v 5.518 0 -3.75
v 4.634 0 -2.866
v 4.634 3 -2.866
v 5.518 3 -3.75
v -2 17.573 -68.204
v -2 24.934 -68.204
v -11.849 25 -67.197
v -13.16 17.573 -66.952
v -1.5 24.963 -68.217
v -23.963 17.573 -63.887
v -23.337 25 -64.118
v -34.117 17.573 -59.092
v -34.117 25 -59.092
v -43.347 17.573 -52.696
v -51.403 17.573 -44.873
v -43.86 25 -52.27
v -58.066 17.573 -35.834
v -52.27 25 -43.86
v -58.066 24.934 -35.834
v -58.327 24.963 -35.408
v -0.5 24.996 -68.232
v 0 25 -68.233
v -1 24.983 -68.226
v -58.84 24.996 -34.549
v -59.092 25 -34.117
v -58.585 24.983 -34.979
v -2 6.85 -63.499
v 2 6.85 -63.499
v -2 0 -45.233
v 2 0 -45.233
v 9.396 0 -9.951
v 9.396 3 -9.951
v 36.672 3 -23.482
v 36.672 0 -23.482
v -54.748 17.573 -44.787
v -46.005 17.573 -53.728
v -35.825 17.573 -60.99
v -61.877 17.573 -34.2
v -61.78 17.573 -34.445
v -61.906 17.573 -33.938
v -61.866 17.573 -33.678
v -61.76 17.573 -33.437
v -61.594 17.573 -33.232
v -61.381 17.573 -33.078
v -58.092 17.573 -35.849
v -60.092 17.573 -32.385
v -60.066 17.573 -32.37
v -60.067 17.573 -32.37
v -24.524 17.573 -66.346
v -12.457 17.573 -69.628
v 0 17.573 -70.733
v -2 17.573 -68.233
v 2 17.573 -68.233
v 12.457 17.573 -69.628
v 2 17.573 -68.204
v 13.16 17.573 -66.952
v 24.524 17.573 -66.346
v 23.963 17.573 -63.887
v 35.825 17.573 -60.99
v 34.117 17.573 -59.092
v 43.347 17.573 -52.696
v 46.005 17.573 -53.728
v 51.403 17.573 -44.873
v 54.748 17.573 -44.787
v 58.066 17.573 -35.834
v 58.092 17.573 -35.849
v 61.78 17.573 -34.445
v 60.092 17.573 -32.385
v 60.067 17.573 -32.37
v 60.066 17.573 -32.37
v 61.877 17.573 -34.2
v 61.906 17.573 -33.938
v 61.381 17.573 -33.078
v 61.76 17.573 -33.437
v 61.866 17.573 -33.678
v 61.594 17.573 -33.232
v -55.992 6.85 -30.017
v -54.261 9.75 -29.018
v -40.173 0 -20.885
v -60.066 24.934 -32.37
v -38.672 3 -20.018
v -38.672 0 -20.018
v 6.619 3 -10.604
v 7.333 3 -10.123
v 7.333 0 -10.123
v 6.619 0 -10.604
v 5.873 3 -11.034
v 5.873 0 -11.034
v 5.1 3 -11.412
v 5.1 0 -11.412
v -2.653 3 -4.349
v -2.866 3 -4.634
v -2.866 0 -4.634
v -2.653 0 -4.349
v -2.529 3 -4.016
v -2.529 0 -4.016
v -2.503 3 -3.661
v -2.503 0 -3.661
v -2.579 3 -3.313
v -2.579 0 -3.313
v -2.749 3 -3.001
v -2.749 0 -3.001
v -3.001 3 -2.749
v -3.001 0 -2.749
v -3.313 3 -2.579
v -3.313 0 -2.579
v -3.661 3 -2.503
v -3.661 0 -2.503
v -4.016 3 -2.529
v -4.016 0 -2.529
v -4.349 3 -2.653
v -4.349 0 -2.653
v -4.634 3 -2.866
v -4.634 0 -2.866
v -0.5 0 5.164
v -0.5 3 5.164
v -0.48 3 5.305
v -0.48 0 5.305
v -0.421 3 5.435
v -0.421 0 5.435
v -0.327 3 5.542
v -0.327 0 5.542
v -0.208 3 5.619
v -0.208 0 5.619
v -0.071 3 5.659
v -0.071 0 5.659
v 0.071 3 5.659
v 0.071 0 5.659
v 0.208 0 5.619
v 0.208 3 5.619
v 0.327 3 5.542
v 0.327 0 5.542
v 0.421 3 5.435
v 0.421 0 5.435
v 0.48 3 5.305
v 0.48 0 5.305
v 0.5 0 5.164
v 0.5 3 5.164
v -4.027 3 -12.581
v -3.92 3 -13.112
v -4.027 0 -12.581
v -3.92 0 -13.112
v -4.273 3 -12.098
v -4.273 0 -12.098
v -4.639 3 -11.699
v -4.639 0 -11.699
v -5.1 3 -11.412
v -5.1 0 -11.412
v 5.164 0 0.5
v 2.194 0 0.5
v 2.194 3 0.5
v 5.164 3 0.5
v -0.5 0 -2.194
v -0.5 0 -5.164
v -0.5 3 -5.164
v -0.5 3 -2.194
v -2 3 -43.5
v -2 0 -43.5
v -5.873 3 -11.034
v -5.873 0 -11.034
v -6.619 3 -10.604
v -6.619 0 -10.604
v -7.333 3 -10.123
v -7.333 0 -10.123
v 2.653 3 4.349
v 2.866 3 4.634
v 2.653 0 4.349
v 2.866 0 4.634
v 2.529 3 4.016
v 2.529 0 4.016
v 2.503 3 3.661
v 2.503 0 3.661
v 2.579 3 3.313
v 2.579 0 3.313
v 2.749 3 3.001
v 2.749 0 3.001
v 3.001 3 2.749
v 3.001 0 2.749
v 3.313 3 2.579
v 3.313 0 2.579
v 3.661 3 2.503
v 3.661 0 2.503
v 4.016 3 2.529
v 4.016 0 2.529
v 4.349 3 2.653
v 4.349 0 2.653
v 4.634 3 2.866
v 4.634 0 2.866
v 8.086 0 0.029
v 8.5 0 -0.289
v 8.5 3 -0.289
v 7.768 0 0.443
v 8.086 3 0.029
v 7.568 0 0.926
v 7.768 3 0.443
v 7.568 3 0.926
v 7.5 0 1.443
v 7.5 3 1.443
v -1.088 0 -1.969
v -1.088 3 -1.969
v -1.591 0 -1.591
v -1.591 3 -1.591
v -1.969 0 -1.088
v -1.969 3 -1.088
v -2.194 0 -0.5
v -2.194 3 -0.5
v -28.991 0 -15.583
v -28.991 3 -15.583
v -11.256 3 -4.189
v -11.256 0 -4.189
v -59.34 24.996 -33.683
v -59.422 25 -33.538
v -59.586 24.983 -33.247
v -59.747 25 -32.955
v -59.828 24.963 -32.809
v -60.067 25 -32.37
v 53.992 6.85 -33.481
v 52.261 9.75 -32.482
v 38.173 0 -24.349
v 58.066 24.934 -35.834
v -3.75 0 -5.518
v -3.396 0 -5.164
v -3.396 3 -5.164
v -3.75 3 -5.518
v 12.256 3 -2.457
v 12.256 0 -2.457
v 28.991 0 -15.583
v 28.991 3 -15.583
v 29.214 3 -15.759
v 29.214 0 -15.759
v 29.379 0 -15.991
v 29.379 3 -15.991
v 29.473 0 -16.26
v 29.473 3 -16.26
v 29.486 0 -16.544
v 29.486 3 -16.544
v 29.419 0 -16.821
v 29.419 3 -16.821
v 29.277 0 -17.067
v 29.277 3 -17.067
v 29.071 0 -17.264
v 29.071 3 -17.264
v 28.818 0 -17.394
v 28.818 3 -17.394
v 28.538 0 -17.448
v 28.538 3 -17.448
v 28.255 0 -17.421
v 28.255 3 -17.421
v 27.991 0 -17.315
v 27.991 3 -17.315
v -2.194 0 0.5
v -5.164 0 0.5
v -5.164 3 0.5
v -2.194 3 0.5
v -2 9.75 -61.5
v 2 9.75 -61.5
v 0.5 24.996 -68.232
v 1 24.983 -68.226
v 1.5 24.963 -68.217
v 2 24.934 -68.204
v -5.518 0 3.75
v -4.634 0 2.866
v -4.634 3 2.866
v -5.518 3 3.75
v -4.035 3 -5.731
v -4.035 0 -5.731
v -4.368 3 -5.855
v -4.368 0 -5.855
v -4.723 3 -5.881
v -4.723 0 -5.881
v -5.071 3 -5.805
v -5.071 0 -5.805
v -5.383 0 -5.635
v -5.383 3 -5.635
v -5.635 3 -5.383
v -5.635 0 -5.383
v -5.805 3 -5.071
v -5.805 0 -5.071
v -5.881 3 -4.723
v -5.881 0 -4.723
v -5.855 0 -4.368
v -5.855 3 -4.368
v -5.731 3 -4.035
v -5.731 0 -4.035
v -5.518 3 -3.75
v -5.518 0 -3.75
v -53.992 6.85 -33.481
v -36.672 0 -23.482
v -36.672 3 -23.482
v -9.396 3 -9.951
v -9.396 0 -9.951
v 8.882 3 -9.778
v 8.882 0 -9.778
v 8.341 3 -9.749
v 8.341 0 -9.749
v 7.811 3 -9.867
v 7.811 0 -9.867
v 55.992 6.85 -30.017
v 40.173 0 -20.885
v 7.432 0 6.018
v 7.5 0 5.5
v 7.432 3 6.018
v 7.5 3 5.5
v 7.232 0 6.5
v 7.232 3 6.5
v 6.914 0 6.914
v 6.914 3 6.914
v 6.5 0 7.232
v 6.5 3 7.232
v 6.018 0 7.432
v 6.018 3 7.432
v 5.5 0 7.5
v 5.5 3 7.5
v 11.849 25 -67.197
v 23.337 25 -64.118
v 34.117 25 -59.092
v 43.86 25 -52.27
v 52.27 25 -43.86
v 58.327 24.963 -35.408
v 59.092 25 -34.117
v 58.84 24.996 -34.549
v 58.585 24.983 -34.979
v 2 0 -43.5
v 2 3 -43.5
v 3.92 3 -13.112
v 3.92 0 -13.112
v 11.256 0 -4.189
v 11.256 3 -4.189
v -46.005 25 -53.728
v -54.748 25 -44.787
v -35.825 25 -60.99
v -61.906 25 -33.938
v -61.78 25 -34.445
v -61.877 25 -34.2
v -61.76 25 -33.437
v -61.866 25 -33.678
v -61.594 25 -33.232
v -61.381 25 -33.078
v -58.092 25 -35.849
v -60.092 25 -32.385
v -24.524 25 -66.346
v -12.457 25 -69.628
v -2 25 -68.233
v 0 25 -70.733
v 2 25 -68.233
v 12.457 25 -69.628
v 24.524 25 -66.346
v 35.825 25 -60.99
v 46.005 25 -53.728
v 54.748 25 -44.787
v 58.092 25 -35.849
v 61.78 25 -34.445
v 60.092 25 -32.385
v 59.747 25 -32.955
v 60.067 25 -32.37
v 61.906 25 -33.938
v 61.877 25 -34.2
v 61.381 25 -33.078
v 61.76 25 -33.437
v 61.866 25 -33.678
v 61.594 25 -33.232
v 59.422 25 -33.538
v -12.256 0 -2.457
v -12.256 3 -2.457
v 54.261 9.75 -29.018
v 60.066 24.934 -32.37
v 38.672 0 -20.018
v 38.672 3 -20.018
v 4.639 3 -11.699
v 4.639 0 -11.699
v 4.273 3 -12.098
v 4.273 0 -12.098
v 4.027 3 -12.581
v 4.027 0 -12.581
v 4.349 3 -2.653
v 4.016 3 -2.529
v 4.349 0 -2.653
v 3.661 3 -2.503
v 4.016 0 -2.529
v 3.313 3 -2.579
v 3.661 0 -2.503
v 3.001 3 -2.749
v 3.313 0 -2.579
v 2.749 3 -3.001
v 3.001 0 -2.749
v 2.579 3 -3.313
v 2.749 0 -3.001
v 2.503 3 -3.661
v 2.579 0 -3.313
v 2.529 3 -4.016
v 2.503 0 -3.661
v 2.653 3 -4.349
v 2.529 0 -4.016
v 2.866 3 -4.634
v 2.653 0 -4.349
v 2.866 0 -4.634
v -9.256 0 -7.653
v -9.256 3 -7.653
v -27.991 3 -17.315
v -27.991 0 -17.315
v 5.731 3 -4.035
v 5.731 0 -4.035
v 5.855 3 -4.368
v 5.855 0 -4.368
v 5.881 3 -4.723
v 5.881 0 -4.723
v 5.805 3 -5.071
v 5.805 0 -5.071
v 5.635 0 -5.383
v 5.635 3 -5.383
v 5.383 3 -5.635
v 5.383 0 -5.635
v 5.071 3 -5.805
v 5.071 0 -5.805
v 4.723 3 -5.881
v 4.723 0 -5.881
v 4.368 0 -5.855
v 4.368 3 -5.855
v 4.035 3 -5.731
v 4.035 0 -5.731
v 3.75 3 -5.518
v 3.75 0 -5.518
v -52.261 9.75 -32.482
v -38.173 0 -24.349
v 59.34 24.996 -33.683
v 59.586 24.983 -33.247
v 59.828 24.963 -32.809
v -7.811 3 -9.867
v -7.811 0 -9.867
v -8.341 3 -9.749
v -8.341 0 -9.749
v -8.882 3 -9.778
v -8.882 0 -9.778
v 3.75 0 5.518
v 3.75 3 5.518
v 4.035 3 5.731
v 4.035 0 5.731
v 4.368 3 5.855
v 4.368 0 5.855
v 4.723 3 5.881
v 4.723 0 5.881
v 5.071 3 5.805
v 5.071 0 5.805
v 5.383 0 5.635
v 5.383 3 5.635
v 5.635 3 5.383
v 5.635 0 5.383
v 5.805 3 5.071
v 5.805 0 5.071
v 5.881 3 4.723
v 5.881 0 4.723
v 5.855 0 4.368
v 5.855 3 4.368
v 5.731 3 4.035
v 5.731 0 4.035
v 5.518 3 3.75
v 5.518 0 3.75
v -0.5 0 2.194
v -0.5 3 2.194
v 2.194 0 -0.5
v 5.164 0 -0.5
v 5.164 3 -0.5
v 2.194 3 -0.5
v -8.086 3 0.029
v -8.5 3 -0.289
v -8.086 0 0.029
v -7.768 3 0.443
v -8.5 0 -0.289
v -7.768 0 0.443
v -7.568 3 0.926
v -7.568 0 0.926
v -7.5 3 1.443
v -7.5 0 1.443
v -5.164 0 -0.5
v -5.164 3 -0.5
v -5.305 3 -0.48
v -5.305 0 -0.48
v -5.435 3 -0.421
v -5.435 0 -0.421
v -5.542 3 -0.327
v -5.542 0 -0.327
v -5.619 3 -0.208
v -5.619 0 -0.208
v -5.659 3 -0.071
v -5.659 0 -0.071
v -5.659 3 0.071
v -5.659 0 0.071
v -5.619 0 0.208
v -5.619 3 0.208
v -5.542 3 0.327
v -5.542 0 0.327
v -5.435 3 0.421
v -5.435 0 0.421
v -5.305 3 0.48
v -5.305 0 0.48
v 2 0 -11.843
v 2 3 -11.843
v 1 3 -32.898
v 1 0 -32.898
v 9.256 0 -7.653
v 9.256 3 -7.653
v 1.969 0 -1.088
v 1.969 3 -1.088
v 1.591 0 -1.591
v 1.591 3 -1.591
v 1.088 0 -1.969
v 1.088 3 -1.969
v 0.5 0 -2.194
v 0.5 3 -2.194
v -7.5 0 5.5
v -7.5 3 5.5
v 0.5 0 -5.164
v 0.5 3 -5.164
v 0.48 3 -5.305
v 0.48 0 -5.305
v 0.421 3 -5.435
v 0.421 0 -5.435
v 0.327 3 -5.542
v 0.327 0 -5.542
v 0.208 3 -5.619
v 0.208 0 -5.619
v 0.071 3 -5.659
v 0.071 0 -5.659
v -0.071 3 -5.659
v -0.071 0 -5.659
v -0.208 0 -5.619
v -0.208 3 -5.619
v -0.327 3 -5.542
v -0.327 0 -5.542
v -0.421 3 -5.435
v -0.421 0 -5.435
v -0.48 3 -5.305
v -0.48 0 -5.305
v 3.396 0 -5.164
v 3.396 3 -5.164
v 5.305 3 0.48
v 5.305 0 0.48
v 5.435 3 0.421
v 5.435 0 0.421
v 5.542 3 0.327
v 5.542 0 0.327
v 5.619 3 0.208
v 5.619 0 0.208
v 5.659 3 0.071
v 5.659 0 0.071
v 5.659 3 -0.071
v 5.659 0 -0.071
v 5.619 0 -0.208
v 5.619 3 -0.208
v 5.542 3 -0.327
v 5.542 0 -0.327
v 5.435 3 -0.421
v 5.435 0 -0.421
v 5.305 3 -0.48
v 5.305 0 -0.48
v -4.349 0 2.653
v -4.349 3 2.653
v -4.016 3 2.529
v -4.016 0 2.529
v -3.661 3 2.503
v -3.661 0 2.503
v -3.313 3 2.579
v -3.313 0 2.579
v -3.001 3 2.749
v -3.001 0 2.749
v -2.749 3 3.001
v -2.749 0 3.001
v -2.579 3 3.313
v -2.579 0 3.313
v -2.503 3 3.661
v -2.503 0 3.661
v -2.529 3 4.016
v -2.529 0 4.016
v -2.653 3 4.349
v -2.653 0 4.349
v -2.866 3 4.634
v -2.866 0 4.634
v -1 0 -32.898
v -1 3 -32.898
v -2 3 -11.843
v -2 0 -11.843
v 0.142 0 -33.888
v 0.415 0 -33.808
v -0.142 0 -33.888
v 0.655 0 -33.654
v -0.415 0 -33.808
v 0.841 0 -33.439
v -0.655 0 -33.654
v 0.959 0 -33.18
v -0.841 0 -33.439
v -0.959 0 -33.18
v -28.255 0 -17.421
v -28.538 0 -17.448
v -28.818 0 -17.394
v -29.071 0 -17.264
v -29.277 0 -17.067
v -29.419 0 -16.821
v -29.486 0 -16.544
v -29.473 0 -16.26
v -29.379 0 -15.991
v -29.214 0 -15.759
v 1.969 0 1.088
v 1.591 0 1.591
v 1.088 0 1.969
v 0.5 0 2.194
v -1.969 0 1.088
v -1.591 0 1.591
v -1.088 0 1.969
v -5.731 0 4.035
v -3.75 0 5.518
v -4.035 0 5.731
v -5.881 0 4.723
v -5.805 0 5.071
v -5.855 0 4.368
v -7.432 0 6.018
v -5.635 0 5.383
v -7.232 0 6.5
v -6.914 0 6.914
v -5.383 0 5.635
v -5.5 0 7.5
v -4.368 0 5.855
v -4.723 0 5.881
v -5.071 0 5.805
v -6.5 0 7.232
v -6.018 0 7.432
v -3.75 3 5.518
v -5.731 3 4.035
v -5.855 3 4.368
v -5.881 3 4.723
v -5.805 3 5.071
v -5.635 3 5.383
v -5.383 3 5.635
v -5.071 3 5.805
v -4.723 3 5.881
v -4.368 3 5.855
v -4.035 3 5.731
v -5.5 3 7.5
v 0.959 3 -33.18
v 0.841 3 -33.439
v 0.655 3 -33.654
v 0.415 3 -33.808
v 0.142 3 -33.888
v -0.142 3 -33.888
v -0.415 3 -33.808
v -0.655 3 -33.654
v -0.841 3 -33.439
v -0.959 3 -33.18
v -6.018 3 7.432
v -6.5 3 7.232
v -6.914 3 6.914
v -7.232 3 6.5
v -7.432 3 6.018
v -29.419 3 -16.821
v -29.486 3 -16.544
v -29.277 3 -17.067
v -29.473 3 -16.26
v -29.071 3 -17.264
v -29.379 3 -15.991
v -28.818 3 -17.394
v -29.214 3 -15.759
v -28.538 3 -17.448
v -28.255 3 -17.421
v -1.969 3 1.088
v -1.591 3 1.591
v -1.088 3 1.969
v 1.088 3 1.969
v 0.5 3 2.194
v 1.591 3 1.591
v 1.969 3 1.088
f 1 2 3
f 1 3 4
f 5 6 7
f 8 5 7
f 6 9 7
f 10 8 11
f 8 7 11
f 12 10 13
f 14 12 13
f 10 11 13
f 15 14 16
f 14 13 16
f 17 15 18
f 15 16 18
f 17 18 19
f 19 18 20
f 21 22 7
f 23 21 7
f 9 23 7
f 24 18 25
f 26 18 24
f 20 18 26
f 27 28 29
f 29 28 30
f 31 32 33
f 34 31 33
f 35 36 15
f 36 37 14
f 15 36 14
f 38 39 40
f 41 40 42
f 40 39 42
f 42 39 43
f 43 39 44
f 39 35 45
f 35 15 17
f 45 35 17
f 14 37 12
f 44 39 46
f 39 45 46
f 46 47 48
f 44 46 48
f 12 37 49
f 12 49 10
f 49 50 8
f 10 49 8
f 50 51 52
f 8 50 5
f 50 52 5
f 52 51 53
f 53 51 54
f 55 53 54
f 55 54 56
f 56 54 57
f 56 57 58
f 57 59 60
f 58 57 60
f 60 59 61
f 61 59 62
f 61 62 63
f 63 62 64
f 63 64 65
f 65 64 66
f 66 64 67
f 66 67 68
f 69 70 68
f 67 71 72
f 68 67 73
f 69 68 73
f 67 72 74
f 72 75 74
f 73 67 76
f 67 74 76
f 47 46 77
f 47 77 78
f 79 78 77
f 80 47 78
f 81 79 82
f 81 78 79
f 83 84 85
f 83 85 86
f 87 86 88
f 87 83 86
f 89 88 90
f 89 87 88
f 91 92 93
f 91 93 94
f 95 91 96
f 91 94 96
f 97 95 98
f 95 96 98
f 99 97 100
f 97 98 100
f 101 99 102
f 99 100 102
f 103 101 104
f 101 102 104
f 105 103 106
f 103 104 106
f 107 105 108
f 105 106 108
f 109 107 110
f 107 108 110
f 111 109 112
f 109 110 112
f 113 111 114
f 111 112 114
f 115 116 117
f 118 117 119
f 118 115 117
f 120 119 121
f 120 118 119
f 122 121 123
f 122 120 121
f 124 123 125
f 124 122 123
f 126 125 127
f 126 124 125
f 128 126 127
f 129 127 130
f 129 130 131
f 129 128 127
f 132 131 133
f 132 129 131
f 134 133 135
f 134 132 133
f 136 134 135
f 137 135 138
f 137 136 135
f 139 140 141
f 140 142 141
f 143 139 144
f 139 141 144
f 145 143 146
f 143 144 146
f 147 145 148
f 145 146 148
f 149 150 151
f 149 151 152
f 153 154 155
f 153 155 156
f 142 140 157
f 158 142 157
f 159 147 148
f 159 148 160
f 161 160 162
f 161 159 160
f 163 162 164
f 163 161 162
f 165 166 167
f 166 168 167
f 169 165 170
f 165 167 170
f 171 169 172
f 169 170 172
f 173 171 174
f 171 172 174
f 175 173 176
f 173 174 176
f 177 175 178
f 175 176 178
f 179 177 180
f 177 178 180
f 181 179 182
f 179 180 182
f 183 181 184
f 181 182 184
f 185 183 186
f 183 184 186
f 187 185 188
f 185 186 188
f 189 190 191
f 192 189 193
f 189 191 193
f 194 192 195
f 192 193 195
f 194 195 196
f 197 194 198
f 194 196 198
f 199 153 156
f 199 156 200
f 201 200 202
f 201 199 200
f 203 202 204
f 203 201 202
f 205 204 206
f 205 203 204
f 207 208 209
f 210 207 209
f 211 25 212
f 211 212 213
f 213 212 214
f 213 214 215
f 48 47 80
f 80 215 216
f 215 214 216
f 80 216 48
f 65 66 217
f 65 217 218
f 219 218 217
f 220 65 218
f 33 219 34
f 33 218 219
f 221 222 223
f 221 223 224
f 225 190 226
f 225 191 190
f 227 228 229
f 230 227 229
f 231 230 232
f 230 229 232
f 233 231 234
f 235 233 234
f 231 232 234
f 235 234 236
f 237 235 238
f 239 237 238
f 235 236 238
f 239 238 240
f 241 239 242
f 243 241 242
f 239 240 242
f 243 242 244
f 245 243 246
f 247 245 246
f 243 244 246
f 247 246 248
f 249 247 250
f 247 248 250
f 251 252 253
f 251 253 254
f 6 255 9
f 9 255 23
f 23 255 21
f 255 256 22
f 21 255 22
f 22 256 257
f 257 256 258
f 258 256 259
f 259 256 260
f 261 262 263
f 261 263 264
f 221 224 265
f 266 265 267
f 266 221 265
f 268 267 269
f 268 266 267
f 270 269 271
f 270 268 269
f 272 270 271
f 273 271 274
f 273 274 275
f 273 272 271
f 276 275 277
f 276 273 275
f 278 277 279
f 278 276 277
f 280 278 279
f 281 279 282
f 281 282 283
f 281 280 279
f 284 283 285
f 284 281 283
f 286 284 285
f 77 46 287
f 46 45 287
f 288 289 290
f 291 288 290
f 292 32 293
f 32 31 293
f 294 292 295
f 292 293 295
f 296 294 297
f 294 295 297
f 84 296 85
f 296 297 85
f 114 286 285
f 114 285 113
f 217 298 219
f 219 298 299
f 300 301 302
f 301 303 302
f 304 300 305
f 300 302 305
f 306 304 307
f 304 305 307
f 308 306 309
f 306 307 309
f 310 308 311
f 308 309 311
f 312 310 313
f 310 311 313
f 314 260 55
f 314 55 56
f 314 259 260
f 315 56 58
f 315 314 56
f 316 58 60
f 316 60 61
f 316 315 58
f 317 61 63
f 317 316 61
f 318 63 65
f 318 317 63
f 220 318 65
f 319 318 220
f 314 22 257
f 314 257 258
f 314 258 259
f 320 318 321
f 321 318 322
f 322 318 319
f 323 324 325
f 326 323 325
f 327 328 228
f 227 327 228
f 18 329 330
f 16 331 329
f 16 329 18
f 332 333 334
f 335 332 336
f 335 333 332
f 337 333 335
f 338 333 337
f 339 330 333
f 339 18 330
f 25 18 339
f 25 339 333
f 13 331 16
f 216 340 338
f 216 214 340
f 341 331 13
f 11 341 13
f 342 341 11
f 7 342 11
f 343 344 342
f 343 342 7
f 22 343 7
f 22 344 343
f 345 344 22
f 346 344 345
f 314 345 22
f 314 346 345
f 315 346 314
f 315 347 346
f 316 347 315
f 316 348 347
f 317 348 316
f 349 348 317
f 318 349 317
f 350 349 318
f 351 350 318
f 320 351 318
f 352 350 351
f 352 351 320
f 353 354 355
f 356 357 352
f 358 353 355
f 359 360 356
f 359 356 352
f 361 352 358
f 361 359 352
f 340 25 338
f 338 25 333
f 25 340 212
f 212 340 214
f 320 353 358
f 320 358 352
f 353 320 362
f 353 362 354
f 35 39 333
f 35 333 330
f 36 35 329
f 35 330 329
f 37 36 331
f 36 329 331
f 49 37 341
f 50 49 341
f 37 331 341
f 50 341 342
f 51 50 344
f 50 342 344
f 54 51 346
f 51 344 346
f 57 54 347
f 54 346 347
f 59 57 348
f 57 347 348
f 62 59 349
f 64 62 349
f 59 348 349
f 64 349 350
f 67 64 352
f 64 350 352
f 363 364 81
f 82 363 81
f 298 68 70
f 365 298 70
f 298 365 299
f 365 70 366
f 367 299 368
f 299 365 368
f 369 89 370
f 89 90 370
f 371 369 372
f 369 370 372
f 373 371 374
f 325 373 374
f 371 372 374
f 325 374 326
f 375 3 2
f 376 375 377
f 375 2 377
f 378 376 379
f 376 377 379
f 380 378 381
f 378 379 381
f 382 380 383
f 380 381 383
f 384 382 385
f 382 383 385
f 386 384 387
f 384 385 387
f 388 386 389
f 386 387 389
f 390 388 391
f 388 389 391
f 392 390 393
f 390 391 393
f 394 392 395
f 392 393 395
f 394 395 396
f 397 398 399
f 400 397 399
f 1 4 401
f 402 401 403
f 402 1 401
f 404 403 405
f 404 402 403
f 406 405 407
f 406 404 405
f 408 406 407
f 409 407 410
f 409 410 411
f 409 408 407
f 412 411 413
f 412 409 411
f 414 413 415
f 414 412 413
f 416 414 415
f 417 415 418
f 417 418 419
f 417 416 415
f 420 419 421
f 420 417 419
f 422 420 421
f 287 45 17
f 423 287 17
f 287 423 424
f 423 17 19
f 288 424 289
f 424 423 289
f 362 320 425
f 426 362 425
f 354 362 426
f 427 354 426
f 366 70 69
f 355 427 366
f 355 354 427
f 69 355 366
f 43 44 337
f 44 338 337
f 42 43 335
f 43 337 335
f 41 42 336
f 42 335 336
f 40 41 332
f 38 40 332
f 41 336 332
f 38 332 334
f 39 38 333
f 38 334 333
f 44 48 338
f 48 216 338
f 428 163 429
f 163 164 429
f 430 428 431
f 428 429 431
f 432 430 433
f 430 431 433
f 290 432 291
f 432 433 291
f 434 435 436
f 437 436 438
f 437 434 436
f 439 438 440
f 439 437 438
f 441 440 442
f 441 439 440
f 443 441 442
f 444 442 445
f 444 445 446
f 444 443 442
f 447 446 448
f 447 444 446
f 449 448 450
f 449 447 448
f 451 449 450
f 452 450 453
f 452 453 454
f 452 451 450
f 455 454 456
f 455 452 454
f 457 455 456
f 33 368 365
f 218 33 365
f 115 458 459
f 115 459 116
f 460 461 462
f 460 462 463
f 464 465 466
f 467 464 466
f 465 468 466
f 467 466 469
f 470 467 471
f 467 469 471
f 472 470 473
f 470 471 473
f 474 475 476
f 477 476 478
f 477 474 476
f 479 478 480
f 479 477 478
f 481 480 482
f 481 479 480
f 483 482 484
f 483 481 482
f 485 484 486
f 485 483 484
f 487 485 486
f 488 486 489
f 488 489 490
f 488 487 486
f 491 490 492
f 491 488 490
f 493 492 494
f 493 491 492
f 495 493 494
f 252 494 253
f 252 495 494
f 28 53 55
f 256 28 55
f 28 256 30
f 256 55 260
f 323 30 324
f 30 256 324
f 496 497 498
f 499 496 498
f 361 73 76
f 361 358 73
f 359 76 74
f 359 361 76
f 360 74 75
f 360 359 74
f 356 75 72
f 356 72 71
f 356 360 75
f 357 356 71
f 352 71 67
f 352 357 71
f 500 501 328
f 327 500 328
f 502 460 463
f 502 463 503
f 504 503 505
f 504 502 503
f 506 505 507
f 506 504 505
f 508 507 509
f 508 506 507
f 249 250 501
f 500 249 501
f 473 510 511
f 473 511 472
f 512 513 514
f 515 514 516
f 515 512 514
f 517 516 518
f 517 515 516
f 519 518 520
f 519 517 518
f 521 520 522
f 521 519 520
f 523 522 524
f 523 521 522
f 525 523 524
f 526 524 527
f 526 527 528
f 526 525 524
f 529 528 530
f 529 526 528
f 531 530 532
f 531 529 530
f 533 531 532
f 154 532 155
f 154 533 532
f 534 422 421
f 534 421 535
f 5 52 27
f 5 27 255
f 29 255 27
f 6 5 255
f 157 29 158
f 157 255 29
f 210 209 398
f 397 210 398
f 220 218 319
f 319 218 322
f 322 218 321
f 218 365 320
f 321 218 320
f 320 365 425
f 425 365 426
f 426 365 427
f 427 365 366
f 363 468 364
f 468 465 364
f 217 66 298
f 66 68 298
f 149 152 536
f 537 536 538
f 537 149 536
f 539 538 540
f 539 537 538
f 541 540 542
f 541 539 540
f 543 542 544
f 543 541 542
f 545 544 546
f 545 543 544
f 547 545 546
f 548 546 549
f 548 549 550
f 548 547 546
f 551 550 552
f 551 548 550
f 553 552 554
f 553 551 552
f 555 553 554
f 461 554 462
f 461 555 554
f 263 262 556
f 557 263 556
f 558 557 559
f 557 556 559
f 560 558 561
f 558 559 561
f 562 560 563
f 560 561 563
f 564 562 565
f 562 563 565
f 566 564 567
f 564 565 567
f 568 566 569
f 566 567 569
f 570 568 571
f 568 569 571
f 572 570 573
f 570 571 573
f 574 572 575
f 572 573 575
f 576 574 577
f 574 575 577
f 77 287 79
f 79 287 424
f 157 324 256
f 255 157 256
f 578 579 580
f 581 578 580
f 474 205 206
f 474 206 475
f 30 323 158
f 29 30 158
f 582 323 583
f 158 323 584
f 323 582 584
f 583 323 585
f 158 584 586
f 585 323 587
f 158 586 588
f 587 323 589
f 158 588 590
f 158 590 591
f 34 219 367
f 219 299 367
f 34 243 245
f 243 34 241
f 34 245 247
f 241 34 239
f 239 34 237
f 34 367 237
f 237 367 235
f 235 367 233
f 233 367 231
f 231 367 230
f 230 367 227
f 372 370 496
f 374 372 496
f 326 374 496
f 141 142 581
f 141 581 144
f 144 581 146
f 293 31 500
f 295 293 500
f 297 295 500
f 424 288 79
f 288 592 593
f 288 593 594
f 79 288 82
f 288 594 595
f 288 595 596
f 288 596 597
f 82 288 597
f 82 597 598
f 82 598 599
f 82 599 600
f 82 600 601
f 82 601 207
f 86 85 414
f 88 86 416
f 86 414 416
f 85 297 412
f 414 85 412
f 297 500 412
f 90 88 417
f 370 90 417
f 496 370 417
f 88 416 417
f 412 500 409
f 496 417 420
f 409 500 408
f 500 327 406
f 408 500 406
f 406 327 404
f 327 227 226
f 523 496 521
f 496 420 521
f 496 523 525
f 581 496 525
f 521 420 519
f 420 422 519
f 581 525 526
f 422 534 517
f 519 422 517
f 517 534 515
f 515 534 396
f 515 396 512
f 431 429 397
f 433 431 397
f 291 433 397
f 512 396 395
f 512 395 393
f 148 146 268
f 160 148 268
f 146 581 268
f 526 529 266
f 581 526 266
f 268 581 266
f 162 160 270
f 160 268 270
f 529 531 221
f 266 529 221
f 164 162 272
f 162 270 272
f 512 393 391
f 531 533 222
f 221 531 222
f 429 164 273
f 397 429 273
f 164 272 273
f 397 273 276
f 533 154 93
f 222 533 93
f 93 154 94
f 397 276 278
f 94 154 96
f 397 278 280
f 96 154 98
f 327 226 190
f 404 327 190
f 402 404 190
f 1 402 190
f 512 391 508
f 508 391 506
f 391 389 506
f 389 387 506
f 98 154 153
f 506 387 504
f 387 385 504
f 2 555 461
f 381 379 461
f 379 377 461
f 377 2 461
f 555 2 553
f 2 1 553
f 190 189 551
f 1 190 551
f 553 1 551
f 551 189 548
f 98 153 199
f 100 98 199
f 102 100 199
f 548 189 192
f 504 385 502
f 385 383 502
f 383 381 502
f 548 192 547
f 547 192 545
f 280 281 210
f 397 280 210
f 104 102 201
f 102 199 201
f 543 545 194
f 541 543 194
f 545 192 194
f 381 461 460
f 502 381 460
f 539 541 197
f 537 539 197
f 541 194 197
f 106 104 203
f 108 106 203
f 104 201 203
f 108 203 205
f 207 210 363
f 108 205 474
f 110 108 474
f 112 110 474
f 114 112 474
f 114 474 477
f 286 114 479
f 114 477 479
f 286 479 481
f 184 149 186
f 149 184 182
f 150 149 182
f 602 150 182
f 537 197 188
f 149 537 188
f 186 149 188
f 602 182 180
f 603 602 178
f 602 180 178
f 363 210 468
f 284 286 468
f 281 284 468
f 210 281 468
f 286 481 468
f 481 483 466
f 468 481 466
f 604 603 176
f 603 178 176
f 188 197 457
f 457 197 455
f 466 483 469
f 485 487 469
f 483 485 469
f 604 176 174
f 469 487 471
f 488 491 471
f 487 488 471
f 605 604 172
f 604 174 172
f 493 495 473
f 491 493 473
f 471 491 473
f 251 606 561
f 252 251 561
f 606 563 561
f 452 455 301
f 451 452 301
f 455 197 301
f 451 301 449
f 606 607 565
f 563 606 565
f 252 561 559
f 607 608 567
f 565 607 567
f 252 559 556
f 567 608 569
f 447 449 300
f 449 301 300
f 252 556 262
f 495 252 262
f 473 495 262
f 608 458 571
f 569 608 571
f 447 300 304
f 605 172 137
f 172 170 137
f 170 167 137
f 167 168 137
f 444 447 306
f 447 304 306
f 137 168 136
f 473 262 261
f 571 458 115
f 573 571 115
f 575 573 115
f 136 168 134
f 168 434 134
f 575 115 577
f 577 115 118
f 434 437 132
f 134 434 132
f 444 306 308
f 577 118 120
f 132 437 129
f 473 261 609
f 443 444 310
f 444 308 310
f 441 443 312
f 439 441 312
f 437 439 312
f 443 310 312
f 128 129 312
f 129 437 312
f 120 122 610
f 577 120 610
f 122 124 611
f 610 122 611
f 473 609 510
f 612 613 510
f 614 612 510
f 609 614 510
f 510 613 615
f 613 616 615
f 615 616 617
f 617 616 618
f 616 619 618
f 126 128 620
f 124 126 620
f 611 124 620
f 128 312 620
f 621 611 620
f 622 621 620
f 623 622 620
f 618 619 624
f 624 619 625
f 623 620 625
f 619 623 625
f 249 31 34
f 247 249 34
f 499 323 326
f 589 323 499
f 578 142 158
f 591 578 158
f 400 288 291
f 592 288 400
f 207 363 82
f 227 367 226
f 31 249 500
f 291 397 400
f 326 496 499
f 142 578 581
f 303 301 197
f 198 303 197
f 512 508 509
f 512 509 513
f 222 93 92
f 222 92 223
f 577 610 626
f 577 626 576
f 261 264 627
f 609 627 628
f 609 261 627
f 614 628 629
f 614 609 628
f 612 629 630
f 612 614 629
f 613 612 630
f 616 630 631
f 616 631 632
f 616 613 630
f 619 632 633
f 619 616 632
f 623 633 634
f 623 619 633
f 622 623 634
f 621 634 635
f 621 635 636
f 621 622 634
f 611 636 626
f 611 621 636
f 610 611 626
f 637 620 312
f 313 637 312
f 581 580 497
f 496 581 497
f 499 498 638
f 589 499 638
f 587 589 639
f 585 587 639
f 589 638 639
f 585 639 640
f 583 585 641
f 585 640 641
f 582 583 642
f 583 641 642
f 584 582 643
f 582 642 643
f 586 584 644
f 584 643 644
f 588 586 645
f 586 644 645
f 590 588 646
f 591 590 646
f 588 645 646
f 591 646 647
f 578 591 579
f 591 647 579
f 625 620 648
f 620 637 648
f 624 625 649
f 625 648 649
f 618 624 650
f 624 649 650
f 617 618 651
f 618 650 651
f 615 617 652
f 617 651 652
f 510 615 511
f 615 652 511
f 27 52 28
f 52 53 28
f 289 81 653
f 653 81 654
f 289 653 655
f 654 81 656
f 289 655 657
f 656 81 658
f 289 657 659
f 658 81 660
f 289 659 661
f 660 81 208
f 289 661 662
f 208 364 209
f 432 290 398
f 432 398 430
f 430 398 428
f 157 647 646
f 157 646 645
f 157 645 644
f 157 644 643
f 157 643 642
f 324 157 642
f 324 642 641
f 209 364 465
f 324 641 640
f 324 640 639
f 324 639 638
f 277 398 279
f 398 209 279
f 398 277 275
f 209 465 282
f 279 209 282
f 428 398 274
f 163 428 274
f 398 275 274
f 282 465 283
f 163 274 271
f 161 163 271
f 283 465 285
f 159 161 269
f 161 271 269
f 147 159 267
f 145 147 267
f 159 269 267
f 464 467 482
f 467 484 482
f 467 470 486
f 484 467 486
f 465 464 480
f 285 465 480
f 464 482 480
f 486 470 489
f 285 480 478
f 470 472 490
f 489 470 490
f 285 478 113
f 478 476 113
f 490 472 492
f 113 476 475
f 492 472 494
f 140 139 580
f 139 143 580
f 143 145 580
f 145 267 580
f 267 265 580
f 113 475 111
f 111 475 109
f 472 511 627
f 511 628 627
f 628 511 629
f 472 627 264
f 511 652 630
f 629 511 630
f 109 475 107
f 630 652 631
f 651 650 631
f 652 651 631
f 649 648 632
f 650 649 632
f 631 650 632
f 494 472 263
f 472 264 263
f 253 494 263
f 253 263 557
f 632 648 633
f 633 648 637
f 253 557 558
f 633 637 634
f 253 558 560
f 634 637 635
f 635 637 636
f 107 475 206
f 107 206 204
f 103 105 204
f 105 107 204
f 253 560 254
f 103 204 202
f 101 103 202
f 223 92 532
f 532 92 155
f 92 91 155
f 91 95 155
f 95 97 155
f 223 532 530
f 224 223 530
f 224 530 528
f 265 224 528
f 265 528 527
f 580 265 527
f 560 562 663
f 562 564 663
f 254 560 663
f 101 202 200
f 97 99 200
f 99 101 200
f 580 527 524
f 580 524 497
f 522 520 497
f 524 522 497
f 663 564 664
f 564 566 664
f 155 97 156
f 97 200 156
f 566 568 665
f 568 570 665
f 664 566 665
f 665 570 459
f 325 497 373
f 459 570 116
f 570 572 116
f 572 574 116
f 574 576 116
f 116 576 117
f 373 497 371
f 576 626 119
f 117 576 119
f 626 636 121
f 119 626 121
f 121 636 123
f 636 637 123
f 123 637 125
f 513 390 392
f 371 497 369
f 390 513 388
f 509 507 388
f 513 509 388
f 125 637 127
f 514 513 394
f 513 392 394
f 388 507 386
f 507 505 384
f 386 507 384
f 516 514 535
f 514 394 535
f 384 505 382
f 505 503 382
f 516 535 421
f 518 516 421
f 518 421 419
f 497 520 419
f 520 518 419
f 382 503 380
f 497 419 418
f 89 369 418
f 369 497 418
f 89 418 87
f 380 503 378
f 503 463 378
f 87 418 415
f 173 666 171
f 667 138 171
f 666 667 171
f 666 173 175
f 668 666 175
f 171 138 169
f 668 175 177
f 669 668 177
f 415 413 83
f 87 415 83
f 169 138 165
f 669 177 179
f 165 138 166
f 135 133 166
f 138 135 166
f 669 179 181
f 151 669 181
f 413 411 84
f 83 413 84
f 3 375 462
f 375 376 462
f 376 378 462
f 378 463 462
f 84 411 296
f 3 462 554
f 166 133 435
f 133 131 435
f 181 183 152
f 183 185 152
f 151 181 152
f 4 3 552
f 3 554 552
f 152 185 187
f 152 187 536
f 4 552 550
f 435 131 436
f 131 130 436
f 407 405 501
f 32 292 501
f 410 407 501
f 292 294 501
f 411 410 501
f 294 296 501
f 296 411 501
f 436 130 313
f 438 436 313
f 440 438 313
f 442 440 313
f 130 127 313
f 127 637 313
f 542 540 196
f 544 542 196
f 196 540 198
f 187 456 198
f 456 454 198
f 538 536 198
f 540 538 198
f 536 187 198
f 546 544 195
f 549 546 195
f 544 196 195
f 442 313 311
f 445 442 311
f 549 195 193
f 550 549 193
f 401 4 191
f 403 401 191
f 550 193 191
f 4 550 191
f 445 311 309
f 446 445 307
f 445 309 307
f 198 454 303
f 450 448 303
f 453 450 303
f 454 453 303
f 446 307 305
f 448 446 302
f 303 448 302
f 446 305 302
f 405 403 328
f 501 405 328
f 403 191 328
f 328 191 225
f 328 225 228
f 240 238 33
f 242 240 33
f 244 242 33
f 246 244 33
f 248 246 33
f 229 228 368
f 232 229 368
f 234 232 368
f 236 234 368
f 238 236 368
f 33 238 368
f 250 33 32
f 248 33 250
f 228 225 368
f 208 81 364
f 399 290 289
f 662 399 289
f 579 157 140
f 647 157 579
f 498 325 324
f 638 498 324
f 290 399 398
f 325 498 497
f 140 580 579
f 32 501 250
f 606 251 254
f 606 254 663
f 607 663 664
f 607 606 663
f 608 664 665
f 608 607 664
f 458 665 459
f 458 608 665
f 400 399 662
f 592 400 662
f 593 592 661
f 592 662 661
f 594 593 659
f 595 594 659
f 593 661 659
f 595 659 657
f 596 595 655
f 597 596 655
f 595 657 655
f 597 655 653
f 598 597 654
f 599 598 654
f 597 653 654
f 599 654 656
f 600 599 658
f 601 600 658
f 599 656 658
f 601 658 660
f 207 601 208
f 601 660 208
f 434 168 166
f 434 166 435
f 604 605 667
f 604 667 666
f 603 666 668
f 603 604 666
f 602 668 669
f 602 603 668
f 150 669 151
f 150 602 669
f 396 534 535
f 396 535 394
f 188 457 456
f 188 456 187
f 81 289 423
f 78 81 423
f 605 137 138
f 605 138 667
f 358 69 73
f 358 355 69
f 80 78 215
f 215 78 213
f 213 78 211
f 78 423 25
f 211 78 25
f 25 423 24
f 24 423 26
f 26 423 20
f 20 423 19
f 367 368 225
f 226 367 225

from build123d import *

# Parameters (mm, degrees)
SKETCH1_W                       = 15
SKETCH1_H                       = 15
BOSS_EXTRUDE1_DEPTH             = 3
BOSS_EXTRUDE2_START             = -1.18
SKETCH7_W                       = 8
SKETCH7_H                       = 3
BOSS_EXTRUDE2_DEPTH             = 6.18
CIRPATTERN2_COUNT               = 2
CIRPATTERN2_ANGLE               = 60
CIRPATTERN2_THE_OTHER_WAY_COUNT = 2
CIRPATTERN2_THE_OTHER_WAY_ANGLE = 60
TAP_DRILL_FOR_M3_TAP1_D         = 2.5
BOSS_EXTRUDE4_DEPTH             = 3
CUT_EXTRUDE1_START              = -10
CUT_EXTRUDE1_DEPTH              = 10
FILLET12_R                      = 2
SKETCH22_W                      = 31
SKETCH22_H                      = 3
BOSS_EXTRUDE11_DEPTH            = 4
CIRPATTERN8_COUNT               = 2
CIRPATTERN8_ANGLE               = 60
CIRPATTERN8_THE_OTHER_WAY_COUNT = 2
CIRPATTERN8_THE_OTHER_WAY_ANGLE = 60
CUT_EXTRUDE2_DEPTH              = 15
FILLET13_R                      = 2
BOSS_EXTRUDE12_DEPTH            = 2
CIRPATTERN9_COUNT               = 2
CIRPATTERN9_ANGLE               = 60
CIRPATTERN9_THE_OTHER_WAY_COUNT = 2
CIRPATTERN9_THE_OTHER_WAY_ANGLE = 60
SKETCH25_W                      = 2.5
SKETCH25_H                      = 7.427363245
REVOLVE1_ANGLE                  = 61.68
REVOLVE1_OTHER_WAY_ANGLE        = 61.68
FILLET14_R                      = 1


with BuildPart() as part:
    # Sketch1 → Boss-Extrude1 (new body)
    with BuildSketch(Plane(origin=(0, 0, 0), x_dir=(1, 0, 0), z_dir=(0, 1, 0))):
        Rectangle(SKETCH1_W, SKETCH1_H)
    extrude(amount=BOSS_EXTRUDE1_DEPTH)

    # Sketch7 → Boss-Extrude2 (add)
    with BuildSketch(Plane(origin=(0, 0, -7.5), x_dir=(-1, 0, 0), z_dir=(0, 0, -1)).offset(BOSS_EXTRUDE2_START)):
        with Locations((0, 1.5)):
            Rectangle(SKETCH7_W, SKETCH7_H)
    boss_extrude2 = extrude(amount=BOSS_EXTRUDE2_DEPTH)

    # CirPattern2: Boss-Extrude2 ×2 about axis
    cirpattern2_axis = Axis((0, 0, 0), (0, -1, 0))
    for i in range(1, CIRPATTERN2_COUNT):
        add(boss_extrude2.rotate(cirpattern2_axis, i * CIRPATTERN2_ANGLE / (CIRPATTERN2_COUNT - 1)))

    # CirPattern2 the other way: Boss-Extrude2 ×2 about axis
    cirpattern2_the_other_way_axis = Axis((0, 0, 0), (0, 1, 0))
    for i in range(1, CIRPATTERN2_THE_OTHER_WAY_COUNT):
        add(boss_extrude2.rotate(cirpattern2_the_other_way_axis, i * CIRPATTERN2_THE_OTHER_WAY_ANGLE / (CIRPATTERN2_THE_OTHER_WAY_COUNT - 1)))

    # Tap Drill for M3 Tap1 (through all)
    with Locations(Plane(origin=(0, 3, 0), x_dir=(1, 0, 0), z_dir=(0, 1, 0))):
        with Locations((-3.75, -3.75), (-3.75, 3.75), (3.75, -3.75), (3.75, 3.75)):
            Hole(TAP_DRILL_FOR_M3_TAP1_D / 2)

    # Sketch10 → Boss-Extrude4 (add)
    with BuildSketch(Plane(origin=(0, 3, 0), x_dir=(1, 0, 0), z_dir=(0, 1, 0))):
        with BuildLine():
            Line((4.990381057, 7.5), (8.256095748, 9.385461256))
            ThreePointArc((8.256095748, 9.385461256), (6.25, 10.825317547), (4, 11.842719282))
            Line((4, 11.842719282), (4, 7.5))
            Line((4, 7.5), (4.990381057, 7.5))
        make_face()
        with BuildLine():
            ThreePointArc((-4, 11.842719282), (-6.25, 10.825317547), (-8.256095748, 9.385461256))
            Line((-8.256095748, 9.385461256), (-4.990381057, 7.5))
            Line((-4.990381057, 7.5), (-4, 7.5))
            Line((-4, 7.5), (-4, 11.842719282))
        make_face()
    extrude(amount=-BOSS_EXTRUDE4_DEPTH)

    # Sketch21 → Cut-Extrude1 (cut)
    with BuildSketch(Plane(origin=(0, 3, 0), x_dir=(1, 0, 0), z_dir=(0, 1, 0)).offset(CUT_EXTRUDE1_START)):
        with BuildLine():
            ThreePointArc((-4.633883476, 2.866116524), (-4.633883476, 4.633883476), (-2.866116524, 4.633883476))
            Line((-2.866116524, 4.633883476), (-3.396446609, 5.164213562))
            Line((-3.396446609, 5.164213562), (-3.75, 5.517766953))
            ThreePointArc((-3.75, 5.517766953), (-5.517766953, 5.517766953), (-5.517766953, 3.75))
            Line((-5.517766953, 3.75), (-4.633883476, 2.866116524))
        make_face()
        with BuildLine():
            ThreePointArc((-0.5, 2.193741097), (-1.590990258, 1.590990258), (-2.193741097, 0.5))
            Line((-2.193741097, 0.5), (-5.164213562, 0.5))
            ThreePointArc((-5.164213562, 0.5), (-5.664213562, 0), (-5.164213562, -0.5))
            Line((-5.164213562, -0.5), (-2.193741097, -0.5))
            ThreePointArc((-2.193741097, -0.5), (-1.590990258, -1.590990258), (-0.5, -2.193741097))
            Line((-0.5, -2.193741097), (-0.5, -5.164213562))
            ThreePointArc((-0.5, -5.164213562), (0, -5.664213562), (0.5, -5.164213562))
            Line((0.5, -5.164213562), (0.5, -2.193741097))
            ThreePointArc((0.5, -2.193741097), (1.590990258, -1.590990258), (2.193741097, -0.5))
            Line((2.193741097, -0.5), (5.164213562, -0.5))
            ThreePointArc((5.164213562, -0.5), (5.664213562, 0), (5.164213562, 0.5))
            Line((5.164213562, 0.5), (2.193741097, 0.5))
            ThreePointArc((2.193741097, 0.5), (1.590990258, 1.590990258), (0.5, 2.193741097))
            Line((0.5, 2.193741097), (0.5, 5.164213562))
            ThreePointArc((0.5, 5.164213562), (0, 5.664213562), (-0.5, 5.164213562))
            Line((-0.5, 5.164213562), (-0.5, 2.193741097))
        make_face()
        with BuildLine():
            Line((3.75, 5.517766953), (3.396446609, 5.164213562))
            Line((3.396446609, 5.164213562), (2.866116524, 4.633883476))
            ThreePointArc((2.866116524, 4.633883476), (4.633883476, 4.633883476), (4.633883476, 2.866116524))
            Line((4.633883476, 2.866116524), (5.517766953, 3.75))
            ThreePointArc((5.517766953, 3.75), (5.517766953, 5.517766953), (3.75, 5.517766953))
        make_face()
        with BuildLine():
            Line((5.517766953, -3.75), (4.633883476, -2.866116524))
            ThreePointArc((4.633883476, -2.866116524), (4.633883476, -4.633883476), (2.866116524, -4.633883476))
            Line((2.866116524, -4.633883476), (3.75, -5.517766953))
            ThreePointArc((3.75, -5.517766953), (5.517766953, -5.517766953), (5.517766953, -3.75))
        make_face()
        with BuildLine():
            Line((-4.633883476, -2.866116524), (-5.517766953, -3.75))
            ThreePointArc((-5.517766953, -3.75), (-5.517766953, -5.517766953), (-3.75, -5.517766953))
            Line((-3.75, -5.517766953), (-2.866116524, -4.633883476))
            ThreePointArc((-2.866116524, -4.633883476), (-4.633883476, -4.633883476), (-4.633883476, -2.866116524))
        make_face()
    extrude(amount=CUT_EXTRUDE1_DEPTH, mode=Mode.SUBTRACT)

    # Fillet12
    fillet12_edges = [part.edges().sort_by_distance(p)[0] for p in [
        (7.5, 1.5, 7.5),
        (-7.5, 1.5, 7.5),
    ]]
    fillet(fillet12_edges, radius=FILLET12_R)

    # Sketch22 → Boss-Extrude11 (add, symmetric)
    with BuildSketch(Plane(origin=(0, 0, 0), x_dir=(0, 0, -1), z_dir=(1, 0, 0))):
        with Locations((28, 1.5)):
            Rectangle(SKETCH22_W, SKETCH22_H)
    boss_extrude11 = extrude(amount=BOSS_EXTRUDE11_DEPTH, both=True)

    # CirPattern8: Boss-Extrude11 ×2 about axis
    cirpattern8_axis = Axis((0, 0, 0), (0, 1, 0))
    for i in range(1, CIRPATTERN8_COUNT):
        add(boss_extrude11.rotate(cirpattern8_axis, i * CIRPATTERN8_ANGLE / (CIRPATTERN8_COUNT - 1)))

    # CirPattern8 the other way: Boss-Extrude11 ×2 about axis
    cirpattern8_the_other_way_axis = Axis((0, 0, 0), (0, -1, 0))
    for i in range(1, CIRPATTERN8_THE_OTHER_WAY_COUNT):
        add(boss_extrude11.rotate(cirpattern8_the_other_way_axis, i * CIRPATTERN8_THE_OTHER_WAY_ANGLE / (CIRPATTERN8_THE_OTHER_WAY_COUNT - 1)))

    # Sketch23 → Cut-Extrude2 (cut)
    with BuildSketch(Plane(origin=(0, 3, 0), x_dir=(1, 0, 0), z_dir=(0, 1, 0))):
        with BuildLine():
            Line((0, 11.842719282), (2, 11.842719282))
            Line((2, 11.842719282), (1, 32.898140757))
            ThreePointArc((1, 32.898140757), (0, 33.898140757), (-1, 32.898140757))
            Line((-1, 32.898140757), (-2, 11.842719282))
            Line((-2, 11.842719282), (0, 11.842719282))
        make_face()
        Polygon((2, 43.5), (4, 11.842719282), (4, 43.5), align=None)
        Polygon((35.672105065, 25.214101615), (8.256095748, 9.385461256), (36.672105065, 23.482050808), align=None)
        Polygon((-4, 43.5), (-4, 11.842719282), (-2, 43.5), align=None)
        with BuildLine():
            Line((27.990625633, 17.315095782), (9.256095748, 7.653410449))
            Line((9.256095748, 7.653410449), (11.256095748, 4.189308834))
            Line((11.256095748, 4.189308834), (28.990625633, 15.583044975))
            ThreePointArc((28.990625633, 15.583044975), (29.356651037, 16.949070379), (27.990625633, 17.315095782))
        make_face()
        Polygon((-36.672105065, 23.482050808), (-8.256095748, 9.385461256), (-35.672105065, 25.214101615), align=None)
        Polygon((39.672105065, 18.285898385), (38.672105065, 20.017949192), (12.256095748, 2.457258026), align=None)
        with BuildLine():
            Line((-11.256095748, 4.189308834), (-9.256095748, 7.653410449))
            Line((-9.256095748, 7.653410449), (-27.990625633, 17.315095782))
            ThreePointArc((-27.990625633, 17.315095782), (-29.356651037, 16.949070379), (-28.990625633, 15.583044975))
            Line((-28.990625633, 15.583044975), (-11.256095748, 4.189308834))
        make_face()
        Polygon((-12.256095748, 2.457258026), (-38.672105065, 20.017949192), (-39.672105065, 18.285898385), align=None)
    extrude(amount=-CUT_EXTRUDE2_DEPTH, mode=Mode.SUBTRACT)

    # Fillet13
    fillet13_edges = [part.edges().sort_by_distance(p)[0] for p in [
        (4, 1.5, -11.842719282),
        (8.256095748, 1.5, -9.385461256),
        (12.256095748, 1.5, -2.457258026),
        (-12.256095748, 1.5, -2.457258026),
        (7.5, 1.5, 0.288675135),
        (-7.5, 1.5, 0.288675135),
        (-8.256095748, 1.5, -9.385461256),
        (-4, 1.5, -11.842719282),
    ]]
    fillet(fillet13_edges, radius=FILLET13_R)

    # Sketch24 → Boss-Extrude12 (add, symmetric)
    with BuildSketch(Plane(origin=(0, 0, 0), x_dir=(0, 0, -1), z_dir=(1, 0, 0))):
        Polygon((68.233351235, 25), (68.233351235, 17.572636755), (63.498764769, 6.849530075), (45.233351235, 0), (43.5, 0), (43.5, 3), (61.5, 9.75), align=None)
    boss_extrude12 = extrude(amount=BOSS_EXTRUDE12_DEPTH, both=True)

    # CirPattern9: Boss-Extrude12 ×2 about axis
    cirpattern9_axis = Axis((0, 0, 0), (0, 1, 0))
    for i in range(1, CIRPATTERN9_COUNT):
        add(boss_extrude12.rotate(cirpattern9_axis, i * CIRPATTERN9_ANGLE / (CIRPATTERN9_COUNT - 1)))

    # CirPattern9 the other way: Boss-Extrude12 ×2 about axis
    cirpattern9_the_other_way_axis = Axis((0, 0, 0), (0, -1, 0))
    for i in range(1, CIRPATTERN9_THE_OTHER_WAY_COUNT):
        add(boss_extrude12.rotate(cirpattern9_the_other_way_axis, i * CIRPATTERN9_THE_OTHER_WAY_ANGLE / (CIRPATTERN9_THE_OTHER_WAY_COUNT - 1)))

    # Sketch25 → Revolve1 (revolve)
    with BuildSketch(Plane(origin=(0, 0, 0), x_dir=(0, 0, -1), z_dir=(1, 0, 0))):
        with Locations((69.483351235, 21.286318378)):
            Rectangle(SKETCH25_W, SKETCH25_H)
    revolve(axis=Axis((0, 0, 0), (0, 1, 0)), revolution_arc=REVOLVE1_ANGLE)

    # Sketch25 → Revolve1 other way (revolve)
    with BuildSketch(Plane(origin=(0, 0, 0), x_dir=(0, 0, -1), z_dir=(1, 0, 0))):
        with Locations((69.483351235, 21.286318378)):
            Rectangle(SKETCH25_W, SKETCH25_H)
    revolve(axis=Axis((0, 0, 0), (0, -1, 0)), revolution_arc=REVOLVE1_OTHER_WAY_ANGLE)

    # Fillet14
    fillet14_edges = [part.edges().sort_by_distance(p)[0] for p in [
        (-62.267404585, 21.286318378, -33.555585275),
        (62.267404585, 21.286318378, -33.555585275),
    ]]
    fillet(fillet14_edges, radius=FILLET14_R)


solid = part.part
